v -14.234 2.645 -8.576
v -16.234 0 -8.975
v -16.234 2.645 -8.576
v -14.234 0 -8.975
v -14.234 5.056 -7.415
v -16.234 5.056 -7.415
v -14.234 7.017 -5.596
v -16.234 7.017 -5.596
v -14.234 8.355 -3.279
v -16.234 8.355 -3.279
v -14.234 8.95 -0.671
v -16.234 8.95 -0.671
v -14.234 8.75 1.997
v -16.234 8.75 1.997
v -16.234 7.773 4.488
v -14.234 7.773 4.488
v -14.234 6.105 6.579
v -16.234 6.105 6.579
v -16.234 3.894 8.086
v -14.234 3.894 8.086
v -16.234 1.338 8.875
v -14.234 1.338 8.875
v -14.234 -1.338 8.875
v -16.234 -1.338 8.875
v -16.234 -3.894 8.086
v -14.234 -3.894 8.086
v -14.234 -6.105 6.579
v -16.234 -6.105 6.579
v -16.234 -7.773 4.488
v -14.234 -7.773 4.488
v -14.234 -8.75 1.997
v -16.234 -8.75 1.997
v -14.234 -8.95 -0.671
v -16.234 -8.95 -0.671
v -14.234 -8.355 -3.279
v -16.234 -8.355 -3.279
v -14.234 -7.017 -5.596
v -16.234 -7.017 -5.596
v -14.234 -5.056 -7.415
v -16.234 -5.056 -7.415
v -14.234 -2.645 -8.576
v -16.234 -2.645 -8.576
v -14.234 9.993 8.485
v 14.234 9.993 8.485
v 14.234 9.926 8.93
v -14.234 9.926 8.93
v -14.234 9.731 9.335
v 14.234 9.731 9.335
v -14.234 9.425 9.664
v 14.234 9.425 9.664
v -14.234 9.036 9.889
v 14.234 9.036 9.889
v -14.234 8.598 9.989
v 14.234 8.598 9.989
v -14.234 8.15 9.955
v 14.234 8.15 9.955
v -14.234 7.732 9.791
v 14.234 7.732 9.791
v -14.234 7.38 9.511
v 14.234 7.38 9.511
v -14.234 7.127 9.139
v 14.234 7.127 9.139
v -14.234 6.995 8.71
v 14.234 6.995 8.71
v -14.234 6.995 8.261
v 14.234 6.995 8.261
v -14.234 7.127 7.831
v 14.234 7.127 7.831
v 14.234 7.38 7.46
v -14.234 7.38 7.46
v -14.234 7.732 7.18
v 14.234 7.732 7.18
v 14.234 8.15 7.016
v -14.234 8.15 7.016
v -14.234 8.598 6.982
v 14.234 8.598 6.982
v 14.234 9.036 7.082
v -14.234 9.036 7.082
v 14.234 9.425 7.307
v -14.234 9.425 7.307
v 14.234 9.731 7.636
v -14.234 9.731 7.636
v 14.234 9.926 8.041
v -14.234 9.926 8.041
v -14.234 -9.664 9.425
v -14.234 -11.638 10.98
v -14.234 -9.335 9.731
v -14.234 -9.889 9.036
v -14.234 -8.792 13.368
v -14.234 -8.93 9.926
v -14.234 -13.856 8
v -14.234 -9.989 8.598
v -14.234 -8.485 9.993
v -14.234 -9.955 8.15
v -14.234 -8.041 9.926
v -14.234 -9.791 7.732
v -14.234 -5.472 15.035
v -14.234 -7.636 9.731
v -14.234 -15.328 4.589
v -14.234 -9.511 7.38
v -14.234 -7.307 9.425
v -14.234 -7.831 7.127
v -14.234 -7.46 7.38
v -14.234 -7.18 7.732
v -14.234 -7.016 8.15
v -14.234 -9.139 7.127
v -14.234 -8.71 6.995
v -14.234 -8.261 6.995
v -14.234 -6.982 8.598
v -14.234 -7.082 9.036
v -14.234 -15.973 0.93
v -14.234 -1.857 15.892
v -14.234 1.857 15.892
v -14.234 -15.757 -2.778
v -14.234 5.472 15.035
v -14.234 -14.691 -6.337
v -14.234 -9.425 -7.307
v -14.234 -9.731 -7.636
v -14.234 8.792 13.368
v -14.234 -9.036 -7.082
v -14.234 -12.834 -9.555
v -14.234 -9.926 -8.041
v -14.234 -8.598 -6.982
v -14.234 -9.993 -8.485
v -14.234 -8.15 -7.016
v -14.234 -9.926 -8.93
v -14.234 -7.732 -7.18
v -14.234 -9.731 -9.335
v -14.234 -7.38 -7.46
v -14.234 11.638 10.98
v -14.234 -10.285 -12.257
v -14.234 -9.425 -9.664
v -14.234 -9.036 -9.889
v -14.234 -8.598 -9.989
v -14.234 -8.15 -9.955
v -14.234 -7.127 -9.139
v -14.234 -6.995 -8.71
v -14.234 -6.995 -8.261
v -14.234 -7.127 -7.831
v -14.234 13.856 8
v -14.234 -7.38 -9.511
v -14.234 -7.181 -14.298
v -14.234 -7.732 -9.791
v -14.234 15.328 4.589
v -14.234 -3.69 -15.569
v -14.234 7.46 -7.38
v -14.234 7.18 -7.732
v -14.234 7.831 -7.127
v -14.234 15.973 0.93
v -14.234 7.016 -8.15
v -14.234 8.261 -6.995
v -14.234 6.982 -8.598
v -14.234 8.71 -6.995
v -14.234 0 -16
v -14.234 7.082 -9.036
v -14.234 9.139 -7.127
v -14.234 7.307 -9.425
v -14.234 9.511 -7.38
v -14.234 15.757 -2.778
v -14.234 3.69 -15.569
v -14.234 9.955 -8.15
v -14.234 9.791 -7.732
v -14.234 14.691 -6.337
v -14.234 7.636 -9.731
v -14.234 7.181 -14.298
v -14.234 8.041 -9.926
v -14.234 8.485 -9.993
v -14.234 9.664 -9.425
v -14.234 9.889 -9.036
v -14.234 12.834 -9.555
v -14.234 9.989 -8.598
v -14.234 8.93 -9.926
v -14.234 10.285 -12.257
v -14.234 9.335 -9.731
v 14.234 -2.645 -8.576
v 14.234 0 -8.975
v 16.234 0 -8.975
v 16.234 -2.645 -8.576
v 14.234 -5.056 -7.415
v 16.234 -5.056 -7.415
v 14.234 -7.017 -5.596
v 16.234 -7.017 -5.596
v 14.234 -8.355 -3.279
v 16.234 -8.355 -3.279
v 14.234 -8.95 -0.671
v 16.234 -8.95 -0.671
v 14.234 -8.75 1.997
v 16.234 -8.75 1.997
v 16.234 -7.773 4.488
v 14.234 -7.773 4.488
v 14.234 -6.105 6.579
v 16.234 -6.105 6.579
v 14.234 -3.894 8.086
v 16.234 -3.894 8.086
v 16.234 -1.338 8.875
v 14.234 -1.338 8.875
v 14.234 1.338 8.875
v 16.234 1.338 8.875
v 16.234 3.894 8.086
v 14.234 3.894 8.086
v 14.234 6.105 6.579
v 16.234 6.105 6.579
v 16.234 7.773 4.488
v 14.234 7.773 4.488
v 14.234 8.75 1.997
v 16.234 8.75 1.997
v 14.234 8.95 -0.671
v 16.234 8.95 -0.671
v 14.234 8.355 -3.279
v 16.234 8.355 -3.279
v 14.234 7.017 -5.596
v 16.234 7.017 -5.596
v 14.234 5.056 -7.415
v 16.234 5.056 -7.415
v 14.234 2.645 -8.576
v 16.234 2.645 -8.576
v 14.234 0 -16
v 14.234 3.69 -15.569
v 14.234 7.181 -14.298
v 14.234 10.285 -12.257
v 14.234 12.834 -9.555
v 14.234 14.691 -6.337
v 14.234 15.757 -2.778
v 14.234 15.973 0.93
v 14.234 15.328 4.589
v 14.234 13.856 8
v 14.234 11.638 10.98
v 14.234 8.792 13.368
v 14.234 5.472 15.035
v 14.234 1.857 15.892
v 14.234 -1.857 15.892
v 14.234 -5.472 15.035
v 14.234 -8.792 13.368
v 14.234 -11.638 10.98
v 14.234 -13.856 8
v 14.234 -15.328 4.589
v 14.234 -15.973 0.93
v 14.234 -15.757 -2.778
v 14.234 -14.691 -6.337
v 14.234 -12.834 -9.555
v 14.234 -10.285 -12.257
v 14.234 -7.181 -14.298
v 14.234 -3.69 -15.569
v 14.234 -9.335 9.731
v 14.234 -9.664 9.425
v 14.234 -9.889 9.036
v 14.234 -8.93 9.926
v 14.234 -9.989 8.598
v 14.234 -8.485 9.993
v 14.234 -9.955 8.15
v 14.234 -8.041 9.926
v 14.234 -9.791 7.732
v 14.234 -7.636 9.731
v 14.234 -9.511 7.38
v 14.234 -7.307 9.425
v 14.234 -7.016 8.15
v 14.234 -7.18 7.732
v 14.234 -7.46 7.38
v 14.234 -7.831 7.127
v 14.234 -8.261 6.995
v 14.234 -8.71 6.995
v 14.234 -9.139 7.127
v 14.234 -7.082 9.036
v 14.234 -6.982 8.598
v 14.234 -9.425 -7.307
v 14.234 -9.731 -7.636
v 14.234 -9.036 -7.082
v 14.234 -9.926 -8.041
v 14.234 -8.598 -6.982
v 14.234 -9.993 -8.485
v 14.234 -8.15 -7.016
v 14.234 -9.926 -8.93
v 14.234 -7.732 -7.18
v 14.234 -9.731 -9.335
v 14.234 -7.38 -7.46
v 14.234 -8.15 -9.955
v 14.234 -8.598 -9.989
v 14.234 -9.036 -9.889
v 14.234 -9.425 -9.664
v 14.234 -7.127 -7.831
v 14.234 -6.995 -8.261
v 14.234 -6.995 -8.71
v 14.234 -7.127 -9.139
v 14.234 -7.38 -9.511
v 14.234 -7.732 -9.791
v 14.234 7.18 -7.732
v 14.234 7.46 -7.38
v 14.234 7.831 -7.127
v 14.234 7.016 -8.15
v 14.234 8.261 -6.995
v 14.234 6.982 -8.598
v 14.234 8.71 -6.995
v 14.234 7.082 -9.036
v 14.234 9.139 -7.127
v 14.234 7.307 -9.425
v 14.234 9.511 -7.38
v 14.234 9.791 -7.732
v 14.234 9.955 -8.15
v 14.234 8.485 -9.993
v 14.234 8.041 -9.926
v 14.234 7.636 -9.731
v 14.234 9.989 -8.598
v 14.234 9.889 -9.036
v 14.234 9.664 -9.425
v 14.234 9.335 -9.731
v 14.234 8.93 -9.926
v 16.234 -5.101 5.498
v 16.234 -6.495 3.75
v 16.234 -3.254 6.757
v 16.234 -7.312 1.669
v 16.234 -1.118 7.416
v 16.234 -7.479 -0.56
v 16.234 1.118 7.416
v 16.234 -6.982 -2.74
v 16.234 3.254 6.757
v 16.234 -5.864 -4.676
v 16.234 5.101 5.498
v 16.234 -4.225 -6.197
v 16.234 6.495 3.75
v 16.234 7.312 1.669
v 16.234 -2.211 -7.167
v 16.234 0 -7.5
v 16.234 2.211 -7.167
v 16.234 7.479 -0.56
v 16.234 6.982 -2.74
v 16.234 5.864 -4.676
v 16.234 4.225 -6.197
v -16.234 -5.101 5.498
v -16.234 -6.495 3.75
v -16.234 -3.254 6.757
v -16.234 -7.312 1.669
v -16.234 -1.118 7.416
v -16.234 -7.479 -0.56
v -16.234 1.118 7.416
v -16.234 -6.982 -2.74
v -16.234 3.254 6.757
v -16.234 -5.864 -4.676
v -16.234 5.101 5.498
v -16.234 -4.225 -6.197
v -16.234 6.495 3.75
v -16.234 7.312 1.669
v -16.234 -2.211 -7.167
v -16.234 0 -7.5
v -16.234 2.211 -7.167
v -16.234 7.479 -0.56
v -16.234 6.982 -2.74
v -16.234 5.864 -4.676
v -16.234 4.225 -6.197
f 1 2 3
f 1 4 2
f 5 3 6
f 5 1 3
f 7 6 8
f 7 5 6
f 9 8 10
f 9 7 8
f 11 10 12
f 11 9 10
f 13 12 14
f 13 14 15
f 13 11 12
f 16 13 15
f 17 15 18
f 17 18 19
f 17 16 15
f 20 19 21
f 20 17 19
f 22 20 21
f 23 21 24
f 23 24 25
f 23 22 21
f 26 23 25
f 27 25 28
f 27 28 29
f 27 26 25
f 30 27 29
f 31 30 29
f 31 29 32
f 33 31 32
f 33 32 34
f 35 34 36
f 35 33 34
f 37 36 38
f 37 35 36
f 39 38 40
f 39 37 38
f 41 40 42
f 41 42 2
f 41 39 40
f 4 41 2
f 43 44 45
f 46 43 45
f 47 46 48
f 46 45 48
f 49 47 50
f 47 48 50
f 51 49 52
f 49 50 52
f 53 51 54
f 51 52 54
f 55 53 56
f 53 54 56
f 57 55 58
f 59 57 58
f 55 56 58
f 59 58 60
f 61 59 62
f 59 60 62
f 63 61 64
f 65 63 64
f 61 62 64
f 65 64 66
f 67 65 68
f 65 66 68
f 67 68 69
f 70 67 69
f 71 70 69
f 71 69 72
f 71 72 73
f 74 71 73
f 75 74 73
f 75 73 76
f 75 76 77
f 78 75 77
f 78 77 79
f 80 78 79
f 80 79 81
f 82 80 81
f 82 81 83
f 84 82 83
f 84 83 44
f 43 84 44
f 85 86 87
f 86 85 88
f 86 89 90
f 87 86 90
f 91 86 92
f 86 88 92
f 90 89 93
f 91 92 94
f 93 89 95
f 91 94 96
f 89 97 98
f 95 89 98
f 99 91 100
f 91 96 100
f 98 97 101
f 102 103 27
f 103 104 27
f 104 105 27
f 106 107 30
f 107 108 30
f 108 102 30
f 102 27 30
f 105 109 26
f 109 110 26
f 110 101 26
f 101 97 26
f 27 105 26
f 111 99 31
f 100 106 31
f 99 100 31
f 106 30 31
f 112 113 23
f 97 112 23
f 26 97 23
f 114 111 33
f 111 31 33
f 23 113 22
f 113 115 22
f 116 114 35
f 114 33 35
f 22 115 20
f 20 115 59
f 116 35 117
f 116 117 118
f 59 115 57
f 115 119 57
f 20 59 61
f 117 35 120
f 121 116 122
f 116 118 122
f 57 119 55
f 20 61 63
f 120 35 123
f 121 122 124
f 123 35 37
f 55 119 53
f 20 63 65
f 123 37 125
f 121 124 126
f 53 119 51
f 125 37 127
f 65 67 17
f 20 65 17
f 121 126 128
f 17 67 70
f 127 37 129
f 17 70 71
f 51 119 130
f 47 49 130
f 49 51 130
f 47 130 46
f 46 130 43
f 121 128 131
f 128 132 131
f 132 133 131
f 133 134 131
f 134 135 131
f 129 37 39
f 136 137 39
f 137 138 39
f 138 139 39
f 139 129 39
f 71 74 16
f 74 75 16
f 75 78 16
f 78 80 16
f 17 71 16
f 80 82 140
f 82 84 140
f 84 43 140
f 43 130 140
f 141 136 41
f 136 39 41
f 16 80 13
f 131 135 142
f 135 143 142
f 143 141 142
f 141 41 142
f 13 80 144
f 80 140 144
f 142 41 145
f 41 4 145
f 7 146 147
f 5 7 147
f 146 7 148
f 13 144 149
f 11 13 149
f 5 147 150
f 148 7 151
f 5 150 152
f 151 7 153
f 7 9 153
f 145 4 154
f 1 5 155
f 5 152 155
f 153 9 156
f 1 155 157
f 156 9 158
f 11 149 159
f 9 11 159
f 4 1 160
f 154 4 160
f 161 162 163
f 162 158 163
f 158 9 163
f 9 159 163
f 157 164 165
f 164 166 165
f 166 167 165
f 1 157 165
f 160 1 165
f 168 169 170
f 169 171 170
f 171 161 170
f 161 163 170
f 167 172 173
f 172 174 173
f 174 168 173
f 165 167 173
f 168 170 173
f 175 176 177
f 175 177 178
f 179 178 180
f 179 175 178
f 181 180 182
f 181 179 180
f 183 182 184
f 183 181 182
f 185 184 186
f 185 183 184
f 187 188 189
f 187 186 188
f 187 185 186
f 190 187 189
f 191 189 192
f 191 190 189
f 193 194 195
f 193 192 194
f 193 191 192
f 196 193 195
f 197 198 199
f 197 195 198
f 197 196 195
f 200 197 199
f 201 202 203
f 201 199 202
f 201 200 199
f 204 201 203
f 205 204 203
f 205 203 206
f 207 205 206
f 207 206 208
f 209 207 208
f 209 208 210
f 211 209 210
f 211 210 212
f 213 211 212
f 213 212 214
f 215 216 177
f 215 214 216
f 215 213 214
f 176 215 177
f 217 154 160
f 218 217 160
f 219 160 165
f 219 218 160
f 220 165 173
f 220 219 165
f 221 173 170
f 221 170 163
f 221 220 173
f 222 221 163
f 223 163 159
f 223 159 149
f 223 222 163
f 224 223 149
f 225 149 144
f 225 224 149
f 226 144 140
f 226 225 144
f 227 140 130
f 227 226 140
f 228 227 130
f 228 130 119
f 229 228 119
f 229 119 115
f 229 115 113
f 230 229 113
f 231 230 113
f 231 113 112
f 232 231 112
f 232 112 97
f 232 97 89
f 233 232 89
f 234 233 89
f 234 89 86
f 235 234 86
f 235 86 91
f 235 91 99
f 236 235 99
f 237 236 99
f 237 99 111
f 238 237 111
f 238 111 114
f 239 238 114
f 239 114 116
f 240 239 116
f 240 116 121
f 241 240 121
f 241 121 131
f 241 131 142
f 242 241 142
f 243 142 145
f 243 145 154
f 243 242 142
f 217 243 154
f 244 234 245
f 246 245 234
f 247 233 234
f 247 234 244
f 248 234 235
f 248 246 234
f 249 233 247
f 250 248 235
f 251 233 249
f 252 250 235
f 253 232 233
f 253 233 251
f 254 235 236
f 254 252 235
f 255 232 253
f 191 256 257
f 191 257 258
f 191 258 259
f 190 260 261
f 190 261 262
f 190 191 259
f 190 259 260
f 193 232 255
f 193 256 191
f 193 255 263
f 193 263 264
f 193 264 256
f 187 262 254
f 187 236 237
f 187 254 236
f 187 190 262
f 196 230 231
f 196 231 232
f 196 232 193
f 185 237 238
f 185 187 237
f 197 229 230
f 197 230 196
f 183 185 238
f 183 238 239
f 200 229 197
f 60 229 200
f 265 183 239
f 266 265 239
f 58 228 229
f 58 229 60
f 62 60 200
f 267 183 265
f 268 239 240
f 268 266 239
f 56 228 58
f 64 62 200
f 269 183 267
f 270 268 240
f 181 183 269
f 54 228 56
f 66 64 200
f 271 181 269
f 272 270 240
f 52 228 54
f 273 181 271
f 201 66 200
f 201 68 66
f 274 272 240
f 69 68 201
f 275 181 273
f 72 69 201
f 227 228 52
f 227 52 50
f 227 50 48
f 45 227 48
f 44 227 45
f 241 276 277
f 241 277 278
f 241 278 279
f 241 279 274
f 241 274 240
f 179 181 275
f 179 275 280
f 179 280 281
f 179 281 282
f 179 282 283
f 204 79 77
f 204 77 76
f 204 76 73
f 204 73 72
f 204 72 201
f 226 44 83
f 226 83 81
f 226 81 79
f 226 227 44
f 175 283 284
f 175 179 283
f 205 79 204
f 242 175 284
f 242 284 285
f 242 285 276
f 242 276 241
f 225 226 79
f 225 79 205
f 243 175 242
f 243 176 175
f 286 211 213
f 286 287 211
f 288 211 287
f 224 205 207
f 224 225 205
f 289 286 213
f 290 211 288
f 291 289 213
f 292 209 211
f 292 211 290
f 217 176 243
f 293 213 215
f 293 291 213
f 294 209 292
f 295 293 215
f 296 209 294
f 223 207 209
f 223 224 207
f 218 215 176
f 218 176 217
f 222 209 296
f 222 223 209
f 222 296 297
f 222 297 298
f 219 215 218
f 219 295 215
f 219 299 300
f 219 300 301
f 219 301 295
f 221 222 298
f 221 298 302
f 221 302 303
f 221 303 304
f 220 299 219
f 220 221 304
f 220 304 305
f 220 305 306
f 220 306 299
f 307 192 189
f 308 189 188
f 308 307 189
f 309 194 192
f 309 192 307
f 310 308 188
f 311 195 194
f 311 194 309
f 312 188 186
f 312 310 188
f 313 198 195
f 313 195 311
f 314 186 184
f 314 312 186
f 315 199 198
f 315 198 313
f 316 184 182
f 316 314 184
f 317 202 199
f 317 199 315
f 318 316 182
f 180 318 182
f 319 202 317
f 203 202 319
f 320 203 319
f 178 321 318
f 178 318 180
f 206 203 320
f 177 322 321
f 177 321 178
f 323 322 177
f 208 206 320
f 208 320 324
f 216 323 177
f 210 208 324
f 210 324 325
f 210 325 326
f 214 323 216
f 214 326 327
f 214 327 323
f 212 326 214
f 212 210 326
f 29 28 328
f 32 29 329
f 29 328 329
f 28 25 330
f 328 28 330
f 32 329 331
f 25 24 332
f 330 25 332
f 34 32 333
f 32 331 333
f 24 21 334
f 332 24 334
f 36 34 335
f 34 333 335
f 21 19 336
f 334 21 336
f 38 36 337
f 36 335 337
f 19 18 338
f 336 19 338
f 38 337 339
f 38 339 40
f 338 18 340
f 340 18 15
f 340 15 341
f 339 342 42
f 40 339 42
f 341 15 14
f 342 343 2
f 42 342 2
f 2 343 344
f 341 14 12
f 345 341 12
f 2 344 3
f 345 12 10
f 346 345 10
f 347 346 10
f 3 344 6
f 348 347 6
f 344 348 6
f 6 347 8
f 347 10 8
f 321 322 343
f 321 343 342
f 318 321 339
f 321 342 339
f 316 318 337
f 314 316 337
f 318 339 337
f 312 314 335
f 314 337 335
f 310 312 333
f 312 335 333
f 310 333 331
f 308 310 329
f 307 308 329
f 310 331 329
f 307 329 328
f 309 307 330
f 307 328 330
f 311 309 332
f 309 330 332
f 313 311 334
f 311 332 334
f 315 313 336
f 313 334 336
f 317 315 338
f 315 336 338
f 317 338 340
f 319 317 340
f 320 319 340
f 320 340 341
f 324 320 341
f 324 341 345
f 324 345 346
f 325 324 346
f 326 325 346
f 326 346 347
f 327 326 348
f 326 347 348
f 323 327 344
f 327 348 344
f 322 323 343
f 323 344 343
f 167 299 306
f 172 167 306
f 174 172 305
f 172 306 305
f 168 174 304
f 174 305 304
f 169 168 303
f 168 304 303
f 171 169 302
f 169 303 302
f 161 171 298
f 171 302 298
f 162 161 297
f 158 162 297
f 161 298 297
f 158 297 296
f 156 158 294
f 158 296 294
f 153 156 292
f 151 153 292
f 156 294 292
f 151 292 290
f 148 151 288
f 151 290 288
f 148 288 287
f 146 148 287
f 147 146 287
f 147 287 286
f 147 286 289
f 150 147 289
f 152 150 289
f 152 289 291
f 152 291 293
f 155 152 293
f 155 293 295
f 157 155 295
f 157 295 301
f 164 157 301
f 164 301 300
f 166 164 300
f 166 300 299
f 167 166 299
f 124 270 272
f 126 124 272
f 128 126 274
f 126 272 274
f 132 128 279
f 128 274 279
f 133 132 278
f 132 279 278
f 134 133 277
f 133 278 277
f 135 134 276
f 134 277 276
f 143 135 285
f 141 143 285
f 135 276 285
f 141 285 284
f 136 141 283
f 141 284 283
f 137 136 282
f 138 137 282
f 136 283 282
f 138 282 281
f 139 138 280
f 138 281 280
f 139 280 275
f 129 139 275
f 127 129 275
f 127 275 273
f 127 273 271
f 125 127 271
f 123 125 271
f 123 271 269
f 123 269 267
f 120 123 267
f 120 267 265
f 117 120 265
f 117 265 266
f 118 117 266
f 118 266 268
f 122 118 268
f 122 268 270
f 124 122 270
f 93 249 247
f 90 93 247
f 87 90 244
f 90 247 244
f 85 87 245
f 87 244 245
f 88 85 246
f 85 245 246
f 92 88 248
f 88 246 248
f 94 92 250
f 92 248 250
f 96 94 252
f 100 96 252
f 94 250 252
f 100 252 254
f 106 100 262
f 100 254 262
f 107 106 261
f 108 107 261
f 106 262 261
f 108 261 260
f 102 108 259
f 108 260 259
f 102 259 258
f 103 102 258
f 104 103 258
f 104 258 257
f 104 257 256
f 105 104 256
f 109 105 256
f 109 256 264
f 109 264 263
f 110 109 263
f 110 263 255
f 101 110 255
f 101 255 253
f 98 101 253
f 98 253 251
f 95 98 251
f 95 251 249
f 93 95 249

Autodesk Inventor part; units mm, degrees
ref_plane "YZ Plane" through (0, 0, 0) normal (1, 0, 0) x (0, 1, 0)
ref_plane "XZ Plane" through (0, 0, 0) normal (0, 1, 0) x (-1, 0, 0)
ref_plane "XY Plane" through (0, 0, 0) normal (0, 0, 1) x (1, 0, 0)
sketch "Sketch1" plane through (0, 0, 0) normal (0, 1, 0) x (-1, 0, 0)
  line L0 (14.234, 0) -> (-14.234, 0)
  line L1 (14.234, 0) -> (14.234, -16)
  line L2 (14.234, -16) -> (-14.234, -16)
  line L3 (-14.234, 0) -> (-14.234, -16)
  line L4 (16.234, 0) -> (16.234, -8.975)
  line L5 (16.234, -8.975) -> (14.234, -8.975)
  line L6 (16.234, 0) -> (14.234, 0)
  line L7 (0, 0) -> (0, -16) construction
  line L8 (-16.234, 0) -> (-16.234, -8.975)
  line L9 (-16.234, -8.975) -> (-14.234, -8.975)
  line L10 (-16.234, 0) -> (-14.234, 0)
  point P0 (-14.234, -8.975)
  dimension "d0" = 28.468
  dimension "d1" = 16
  dimension "d2" = 8.975
  dimension "d3" = 2
  dimension "d52" = 16
  dimension "d53" = 14.234
  dimension "d54" = 14.234
  dimension "d55" = 32.468
revolve "Revolution1" add sketch "Sketch1" angle 360 about axis through (-14.234, 0, 0) along (1, 0, 0)
sketch "Sketch3" plane through (14.234, 0, 0) normal (1, 0, 0) x (0, 0, -1)
  line L0 (0, 0) -> (0, 21.0687)
  circle A0 centre (0, 0) radius 12
  line L1 (0, 0) -> (15.1968, 15.1968)
  circle A1 centre (8.4853, 8.4853) radius 1.5075
  dimension "d12" = 24
  dimension "d13" = 45
  dimension "d14" = 3.015
extrude "Extrusion1" cut sketch "Sketch3" against normal through all contours A1 A0 L1 | L1 A0 A1 | A1 L1 A0 | L1 A1 A0
thread "Thread1" size "M3x0.5" class "6H" standard "ANSI Metric M Profile" full length
sketch "Sketch5" plane through (16.234, 0, 0) normal (1, 0, 0) x (0, 0, -1)
  circle A0 centre (0, 0) radius 8.975 projected
  point P0 (0, 0)
hole "Hole3" at (16.234, 0, 0) direction (-1, 0, 0) diameter 15 end through all
pattern_circular "Circular Pattern3" count 4 over 360 about axis through (-39.4631, 0, 0) along (1, 0, 0) of "Extrusion1"
properties part number "shaft" material "Stainless Steel"
